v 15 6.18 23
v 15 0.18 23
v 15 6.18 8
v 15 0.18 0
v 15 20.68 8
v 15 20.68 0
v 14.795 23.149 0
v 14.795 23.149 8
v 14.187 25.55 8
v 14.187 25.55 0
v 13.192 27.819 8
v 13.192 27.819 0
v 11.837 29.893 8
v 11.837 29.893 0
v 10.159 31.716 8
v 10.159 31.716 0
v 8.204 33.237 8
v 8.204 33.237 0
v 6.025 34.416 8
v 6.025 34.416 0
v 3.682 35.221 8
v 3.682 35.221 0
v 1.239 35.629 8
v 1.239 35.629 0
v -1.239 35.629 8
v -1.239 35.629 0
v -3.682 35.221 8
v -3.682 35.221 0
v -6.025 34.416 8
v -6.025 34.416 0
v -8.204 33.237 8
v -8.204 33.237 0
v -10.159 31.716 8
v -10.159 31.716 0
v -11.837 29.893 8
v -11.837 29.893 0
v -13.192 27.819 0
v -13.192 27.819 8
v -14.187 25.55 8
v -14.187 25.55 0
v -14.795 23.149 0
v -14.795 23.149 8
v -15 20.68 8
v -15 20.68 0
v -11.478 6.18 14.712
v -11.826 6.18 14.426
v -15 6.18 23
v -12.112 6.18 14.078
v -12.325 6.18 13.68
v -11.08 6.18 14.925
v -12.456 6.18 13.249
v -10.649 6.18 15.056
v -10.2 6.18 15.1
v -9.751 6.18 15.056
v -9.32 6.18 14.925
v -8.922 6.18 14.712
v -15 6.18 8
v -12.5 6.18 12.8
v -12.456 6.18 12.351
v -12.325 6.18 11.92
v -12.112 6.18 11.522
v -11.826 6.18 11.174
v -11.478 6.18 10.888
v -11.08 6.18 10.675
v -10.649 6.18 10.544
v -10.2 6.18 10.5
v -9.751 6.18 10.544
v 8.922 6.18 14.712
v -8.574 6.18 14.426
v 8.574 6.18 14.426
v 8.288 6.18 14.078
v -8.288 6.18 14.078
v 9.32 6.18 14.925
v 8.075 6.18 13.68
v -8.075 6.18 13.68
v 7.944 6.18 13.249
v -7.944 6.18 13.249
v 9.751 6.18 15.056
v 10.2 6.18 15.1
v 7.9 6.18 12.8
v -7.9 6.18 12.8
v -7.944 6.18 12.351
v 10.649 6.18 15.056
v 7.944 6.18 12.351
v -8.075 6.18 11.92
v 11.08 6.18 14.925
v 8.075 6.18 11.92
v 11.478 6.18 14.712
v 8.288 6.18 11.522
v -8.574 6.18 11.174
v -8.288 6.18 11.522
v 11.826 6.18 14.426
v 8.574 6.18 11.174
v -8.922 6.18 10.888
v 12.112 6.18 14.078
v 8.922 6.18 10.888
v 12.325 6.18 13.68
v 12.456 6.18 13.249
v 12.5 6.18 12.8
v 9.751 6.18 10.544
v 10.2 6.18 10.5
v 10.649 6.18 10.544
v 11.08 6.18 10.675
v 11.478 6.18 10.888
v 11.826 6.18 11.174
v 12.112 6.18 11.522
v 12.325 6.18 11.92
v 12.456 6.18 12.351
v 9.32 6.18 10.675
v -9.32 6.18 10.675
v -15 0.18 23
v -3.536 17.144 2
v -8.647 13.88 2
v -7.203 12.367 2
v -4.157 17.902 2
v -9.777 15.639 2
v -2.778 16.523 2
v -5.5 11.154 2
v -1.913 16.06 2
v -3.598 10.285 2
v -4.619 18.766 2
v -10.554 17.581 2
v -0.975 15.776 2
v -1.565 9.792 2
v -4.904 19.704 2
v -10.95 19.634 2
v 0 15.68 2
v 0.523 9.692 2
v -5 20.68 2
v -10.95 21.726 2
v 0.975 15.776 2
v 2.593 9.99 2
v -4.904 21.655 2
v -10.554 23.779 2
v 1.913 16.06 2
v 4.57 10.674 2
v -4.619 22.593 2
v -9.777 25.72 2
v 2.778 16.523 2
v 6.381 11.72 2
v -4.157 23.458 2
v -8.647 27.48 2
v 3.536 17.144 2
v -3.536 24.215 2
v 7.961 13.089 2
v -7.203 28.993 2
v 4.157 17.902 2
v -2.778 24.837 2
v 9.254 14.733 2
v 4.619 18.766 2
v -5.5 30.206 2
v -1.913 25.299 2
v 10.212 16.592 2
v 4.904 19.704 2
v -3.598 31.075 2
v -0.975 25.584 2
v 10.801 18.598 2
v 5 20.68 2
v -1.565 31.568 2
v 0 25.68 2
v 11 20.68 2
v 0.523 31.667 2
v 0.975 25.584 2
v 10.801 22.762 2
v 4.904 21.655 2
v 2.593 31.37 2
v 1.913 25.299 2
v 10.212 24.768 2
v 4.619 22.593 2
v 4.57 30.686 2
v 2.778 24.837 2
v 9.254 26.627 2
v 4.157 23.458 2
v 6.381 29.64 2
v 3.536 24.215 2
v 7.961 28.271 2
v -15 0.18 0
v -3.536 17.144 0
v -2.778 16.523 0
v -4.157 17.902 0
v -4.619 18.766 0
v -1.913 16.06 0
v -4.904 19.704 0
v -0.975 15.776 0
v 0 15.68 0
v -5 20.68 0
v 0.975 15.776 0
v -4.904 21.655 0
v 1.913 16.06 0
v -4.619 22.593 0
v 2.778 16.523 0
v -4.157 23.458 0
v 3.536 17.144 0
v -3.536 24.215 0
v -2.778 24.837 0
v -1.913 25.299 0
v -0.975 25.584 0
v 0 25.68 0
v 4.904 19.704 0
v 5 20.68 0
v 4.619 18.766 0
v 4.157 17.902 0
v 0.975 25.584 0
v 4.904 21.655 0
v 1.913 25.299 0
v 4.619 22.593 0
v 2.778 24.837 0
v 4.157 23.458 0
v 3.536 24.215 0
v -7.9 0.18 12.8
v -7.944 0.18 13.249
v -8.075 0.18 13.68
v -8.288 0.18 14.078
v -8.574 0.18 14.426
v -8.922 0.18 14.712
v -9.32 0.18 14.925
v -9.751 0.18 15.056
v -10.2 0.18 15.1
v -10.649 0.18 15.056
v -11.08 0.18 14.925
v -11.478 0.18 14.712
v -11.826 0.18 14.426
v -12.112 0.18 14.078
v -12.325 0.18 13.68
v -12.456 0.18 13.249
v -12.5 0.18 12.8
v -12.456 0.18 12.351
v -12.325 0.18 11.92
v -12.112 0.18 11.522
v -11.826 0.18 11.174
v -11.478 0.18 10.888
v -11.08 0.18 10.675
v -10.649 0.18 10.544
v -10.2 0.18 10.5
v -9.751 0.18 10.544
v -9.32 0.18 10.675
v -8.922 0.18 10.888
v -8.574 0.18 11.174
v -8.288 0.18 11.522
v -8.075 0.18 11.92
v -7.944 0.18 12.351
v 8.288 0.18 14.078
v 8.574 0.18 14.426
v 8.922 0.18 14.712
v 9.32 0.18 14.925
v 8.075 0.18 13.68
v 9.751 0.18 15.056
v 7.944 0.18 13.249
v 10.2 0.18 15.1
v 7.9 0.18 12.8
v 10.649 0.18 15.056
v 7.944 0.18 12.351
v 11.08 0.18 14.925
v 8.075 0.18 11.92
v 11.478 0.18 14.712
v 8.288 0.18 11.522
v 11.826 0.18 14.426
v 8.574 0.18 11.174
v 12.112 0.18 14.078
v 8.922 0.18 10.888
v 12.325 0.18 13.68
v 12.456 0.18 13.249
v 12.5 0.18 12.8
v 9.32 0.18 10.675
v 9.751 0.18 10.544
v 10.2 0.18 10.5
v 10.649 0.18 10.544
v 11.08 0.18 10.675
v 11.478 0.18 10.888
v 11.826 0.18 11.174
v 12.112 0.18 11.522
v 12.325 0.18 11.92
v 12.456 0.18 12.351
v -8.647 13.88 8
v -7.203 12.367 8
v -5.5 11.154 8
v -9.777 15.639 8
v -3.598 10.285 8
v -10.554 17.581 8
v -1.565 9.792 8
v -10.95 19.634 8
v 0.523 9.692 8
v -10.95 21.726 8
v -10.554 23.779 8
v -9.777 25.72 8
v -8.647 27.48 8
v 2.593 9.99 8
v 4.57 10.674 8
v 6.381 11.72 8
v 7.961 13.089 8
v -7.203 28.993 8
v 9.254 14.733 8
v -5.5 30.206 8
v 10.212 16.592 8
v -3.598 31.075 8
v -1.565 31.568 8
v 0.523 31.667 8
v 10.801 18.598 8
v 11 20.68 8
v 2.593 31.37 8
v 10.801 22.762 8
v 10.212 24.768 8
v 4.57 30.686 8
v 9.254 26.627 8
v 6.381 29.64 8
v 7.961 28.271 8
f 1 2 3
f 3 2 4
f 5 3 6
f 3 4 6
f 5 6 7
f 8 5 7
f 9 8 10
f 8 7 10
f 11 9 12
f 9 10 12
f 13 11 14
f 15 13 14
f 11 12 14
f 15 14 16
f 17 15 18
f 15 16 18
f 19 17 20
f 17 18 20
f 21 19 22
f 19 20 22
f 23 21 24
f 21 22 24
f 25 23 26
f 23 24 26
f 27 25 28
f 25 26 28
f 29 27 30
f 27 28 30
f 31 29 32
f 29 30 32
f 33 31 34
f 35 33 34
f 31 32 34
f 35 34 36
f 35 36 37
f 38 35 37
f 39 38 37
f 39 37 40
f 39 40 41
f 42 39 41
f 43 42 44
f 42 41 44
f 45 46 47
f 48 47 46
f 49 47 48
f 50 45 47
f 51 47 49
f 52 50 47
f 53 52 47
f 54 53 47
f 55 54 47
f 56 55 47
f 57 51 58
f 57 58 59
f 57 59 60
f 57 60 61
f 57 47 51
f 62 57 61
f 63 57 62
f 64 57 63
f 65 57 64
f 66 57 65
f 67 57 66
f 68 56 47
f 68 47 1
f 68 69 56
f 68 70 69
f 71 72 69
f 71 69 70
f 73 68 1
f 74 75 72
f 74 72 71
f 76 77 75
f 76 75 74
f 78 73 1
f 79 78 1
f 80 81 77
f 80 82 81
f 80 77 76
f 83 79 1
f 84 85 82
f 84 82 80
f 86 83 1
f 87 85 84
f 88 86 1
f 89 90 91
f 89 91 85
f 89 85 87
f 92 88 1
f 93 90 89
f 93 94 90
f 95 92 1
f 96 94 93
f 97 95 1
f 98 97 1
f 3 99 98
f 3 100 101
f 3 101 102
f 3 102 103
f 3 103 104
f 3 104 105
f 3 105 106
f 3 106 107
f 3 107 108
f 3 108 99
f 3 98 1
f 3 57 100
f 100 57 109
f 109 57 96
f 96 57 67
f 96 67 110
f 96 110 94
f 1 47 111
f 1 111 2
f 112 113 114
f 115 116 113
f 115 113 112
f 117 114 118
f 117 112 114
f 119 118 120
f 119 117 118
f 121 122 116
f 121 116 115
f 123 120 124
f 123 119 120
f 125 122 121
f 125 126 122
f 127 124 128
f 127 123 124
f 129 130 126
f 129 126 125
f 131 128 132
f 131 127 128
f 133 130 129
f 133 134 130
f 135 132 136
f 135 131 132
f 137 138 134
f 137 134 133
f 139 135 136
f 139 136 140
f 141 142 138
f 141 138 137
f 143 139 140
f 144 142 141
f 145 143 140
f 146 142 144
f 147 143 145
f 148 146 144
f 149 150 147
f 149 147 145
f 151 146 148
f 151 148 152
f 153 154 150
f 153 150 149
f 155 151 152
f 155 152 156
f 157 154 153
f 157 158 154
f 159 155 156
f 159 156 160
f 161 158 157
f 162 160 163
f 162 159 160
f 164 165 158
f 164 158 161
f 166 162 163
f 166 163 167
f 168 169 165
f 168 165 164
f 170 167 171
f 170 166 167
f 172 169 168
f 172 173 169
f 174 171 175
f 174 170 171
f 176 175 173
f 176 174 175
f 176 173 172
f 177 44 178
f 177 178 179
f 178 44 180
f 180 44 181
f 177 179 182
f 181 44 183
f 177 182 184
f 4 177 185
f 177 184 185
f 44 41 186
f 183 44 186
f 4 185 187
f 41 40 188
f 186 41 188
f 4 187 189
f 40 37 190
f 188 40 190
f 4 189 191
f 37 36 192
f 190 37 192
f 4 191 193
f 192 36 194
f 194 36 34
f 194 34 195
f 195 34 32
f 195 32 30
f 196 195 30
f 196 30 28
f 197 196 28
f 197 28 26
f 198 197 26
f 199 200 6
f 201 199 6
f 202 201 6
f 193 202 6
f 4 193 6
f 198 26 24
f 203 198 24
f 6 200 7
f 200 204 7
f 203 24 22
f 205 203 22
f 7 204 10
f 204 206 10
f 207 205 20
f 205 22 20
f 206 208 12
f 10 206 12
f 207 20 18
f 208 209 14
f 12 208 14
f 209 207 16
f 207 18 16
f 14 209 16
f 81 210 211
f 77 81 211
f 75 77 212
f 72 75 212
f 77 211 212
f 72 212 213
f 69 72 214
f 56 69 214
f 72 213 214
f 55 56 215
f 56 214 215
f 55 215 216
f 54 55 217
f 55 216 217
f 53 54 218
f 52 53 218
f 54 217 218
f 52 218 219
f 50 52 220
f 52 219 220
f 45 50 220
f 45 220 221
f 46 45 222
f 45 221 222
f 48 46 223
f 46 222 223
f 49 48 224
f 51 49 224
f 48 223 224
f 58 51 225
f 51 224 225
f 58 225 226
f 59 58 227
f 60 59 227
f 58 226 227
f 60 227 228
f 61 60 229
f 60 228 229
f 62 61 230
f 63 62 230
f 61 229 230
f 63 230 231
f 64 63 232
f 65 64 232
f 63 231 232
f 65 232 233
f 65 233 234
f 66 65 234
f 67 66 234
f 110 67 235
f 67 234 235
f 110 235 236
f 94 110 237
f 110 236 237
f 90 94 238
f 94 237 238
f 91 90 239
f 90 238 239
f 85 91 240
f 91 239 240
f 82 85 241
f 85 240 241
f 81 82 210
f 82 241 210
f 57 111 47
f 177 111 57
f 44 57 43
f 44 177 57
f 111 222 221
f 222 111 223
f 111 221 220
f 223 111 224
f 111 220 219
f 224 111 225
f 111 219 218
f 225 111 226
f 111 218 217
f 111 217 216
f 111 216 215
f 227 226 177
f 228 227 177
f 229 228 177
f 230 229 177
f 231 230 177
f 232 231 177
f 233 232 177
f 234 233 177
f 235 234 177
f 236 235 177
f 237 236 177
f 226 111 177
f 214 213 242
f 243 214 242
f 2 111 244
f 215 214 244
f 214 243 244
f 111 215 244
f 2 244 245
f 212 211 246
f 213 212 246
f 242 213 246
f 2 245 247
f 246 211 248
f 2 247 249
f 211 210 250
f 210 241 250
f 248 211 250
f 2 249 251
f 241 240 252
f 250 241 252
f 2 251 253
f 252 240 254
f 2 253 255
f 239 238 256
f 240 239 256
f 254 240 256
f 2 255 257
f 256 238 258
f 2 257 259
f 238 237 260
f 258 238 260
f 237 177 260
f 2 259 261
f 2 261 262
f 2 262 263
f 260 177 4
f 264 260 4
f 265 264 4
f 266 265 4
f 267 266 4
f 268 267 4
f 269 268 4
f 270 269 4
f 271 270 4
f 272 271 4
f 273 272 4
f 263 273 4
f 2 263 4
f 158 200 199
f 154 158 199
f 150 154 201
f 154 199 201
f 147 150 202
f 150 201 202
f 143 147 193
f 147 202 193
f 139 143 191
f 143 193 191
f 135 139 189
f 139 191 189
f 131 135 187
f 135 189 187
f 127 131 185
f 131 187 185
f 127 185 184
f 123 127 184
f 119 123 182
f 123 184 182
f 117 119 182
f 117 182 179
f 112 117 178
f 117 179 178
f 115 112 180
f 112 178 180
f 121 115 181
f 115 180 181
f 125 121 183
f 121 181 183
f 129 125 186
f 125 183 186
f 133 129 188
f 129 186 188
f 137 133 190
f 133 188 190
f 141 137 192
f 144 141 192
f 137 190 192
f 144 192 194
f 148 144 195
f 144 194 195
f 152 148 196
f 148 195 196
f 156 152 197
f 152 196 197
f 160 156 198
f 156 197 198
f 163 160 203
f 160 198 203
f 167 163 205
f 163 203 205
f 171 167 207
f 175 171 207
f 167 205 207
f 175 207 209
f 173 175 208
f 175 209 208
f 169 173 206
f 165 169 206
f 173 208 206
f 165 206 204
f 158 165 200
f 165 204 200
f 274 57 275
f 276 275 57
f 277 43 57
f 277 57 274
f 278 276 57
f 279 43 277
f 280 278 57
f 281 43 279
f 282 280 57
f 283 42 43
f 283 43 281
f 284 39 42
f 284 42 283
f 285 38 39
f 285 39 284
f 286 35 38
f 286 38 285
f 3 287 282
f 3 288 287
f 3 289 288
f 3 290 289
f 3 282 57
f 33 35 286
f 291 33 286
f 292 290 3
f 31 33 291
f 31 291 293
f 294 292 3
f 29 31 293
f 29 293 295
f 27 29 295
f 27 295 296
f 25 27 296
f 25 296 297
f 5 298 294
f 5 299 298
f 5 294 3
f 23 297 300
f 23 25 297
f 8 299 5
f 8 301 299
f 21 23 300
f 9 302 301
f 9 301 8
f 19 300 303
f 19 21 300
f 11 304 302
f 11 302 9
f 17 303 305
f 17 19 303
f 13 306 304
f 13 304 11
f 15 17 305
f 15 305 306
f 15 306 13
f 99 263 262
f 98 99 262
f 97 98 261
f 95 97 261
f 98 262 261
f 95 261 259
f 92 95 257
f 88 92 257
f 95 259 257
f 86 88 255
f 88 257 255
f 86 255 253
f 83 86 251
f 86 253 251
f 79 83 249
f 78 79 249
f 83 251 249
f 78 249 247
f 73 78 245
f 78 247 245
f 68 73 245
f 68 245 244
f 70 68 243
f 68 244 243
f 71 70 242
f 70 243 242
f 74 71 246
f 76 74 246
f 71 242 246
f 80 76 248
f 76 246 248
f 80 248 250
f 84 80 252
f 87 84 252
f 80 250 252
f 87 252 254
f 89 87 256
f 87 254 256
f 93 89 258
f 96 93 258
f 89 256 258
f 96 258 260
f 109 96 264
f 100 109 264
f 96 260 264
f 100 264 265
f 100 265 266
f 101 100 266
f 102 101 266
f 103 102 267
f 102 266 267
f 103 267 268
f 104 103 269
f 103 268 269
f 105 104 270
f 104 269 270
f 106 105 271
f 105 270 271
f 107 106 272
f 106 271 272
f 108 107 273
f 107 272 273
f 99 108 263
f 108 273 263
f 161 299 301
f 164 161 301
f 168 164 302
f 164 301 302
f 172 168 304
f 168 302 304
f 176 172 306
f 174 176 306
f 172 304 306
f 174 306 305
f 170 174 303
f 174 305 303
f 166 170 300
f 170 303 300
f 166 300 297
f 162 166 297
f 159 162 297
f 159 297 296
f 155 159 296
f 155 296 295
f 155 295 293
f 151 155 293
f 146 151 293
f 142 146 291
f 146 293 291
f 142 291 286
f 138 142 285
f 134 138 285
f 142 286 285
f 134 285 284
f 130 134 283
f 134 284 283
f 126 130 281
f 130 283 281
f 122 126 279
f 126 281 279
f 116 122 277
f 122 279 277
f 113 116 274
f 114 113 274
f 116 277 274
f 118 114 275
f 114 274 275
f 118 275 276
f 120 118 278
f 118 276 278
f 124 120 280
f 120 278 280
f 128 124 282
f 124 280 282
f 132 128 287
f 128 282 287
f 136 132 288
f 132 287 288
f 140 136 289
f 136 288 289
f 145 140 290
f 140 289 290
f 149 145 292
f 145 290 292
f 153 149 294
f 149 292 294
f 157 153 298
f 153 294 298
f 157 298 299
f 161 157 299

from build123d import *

# Parameters (mm, degrees)
PAD_DEPTH       = 8
SKETCH001_R     = 11
POCKET_DEPTH    = 6
SKETCH002_R     = 5
POCKET001_DEPTH = 2
SKETCH003_W     = 30
SKETCH003_H     = 6
PAD001_DEPTH    = 15
SKETCH004_R     = 2.3
POCKET002_DEPTH = 6


with BuildPart() as part:
    # Sketch → Pad (new body)
    with BuildSketch(Plane.XY):
        with BuildLine():
            ThreePointArc((15, 20.679889), (0, 35.679889), (-15, 20.679889))
            Line((-15, 20.679889), (-15, 0.179889))
            Line((-15, 0.179889), (15, 0.179889))
            Line((15, 20.679889), (15, 0.179889))
        make_face()
    extrude(amount=PAD_DEPTH)

    # Sketch001 (on Face6 of Pad) → Pocket (cut)
    with BuildSketch(Plane.XY.offset(8)):
        with Locations((0, 20.679889)):
            Circle(SKETCH001_R)
    extrude(amount=-POCKET_DEPTH, mode=Mode.SUBTRACT)

    # Sketch002 (on Face4 of Pocket) → Pocket001 (cut)
    with BuildSketch(Plane(origin=(0, 0, 0), x_dir=(1, 0, 0), z_dir=(0, 0, -1))):
        with Locations((0, -20.679889)):
            Circle(SKETCH002_R)
    extrude(amount=-POCKET001_DEPTH, mode=Mode.SUBTRACT)

    # Sketch003 (on Face5 of Pocket001) → Pad001 (join)
    with BuildSketch(Plane.XY.offset(8)):
        with Locations((0, 3.179889)):
            Rectangle(SKETCH003_W, SKETCH003_H)
    extrude(amount=PAD001_DEPTH)

    # Sketch004 (on Face12 of Pad001) → Pocket002 (cut)
    with BuildSketch(Plane.XZ.offset(-0.179889)):
        with Locations((-10.2, 12.8)):
            Circle(SKETCH004_R)
        with Locations((10.2, 12.8)):
            Circle(SKETCH004_R)
    extrude(amount=-POCKET002_DEPTH, mode=Mode.SUBTRACT)


solid = part.part
